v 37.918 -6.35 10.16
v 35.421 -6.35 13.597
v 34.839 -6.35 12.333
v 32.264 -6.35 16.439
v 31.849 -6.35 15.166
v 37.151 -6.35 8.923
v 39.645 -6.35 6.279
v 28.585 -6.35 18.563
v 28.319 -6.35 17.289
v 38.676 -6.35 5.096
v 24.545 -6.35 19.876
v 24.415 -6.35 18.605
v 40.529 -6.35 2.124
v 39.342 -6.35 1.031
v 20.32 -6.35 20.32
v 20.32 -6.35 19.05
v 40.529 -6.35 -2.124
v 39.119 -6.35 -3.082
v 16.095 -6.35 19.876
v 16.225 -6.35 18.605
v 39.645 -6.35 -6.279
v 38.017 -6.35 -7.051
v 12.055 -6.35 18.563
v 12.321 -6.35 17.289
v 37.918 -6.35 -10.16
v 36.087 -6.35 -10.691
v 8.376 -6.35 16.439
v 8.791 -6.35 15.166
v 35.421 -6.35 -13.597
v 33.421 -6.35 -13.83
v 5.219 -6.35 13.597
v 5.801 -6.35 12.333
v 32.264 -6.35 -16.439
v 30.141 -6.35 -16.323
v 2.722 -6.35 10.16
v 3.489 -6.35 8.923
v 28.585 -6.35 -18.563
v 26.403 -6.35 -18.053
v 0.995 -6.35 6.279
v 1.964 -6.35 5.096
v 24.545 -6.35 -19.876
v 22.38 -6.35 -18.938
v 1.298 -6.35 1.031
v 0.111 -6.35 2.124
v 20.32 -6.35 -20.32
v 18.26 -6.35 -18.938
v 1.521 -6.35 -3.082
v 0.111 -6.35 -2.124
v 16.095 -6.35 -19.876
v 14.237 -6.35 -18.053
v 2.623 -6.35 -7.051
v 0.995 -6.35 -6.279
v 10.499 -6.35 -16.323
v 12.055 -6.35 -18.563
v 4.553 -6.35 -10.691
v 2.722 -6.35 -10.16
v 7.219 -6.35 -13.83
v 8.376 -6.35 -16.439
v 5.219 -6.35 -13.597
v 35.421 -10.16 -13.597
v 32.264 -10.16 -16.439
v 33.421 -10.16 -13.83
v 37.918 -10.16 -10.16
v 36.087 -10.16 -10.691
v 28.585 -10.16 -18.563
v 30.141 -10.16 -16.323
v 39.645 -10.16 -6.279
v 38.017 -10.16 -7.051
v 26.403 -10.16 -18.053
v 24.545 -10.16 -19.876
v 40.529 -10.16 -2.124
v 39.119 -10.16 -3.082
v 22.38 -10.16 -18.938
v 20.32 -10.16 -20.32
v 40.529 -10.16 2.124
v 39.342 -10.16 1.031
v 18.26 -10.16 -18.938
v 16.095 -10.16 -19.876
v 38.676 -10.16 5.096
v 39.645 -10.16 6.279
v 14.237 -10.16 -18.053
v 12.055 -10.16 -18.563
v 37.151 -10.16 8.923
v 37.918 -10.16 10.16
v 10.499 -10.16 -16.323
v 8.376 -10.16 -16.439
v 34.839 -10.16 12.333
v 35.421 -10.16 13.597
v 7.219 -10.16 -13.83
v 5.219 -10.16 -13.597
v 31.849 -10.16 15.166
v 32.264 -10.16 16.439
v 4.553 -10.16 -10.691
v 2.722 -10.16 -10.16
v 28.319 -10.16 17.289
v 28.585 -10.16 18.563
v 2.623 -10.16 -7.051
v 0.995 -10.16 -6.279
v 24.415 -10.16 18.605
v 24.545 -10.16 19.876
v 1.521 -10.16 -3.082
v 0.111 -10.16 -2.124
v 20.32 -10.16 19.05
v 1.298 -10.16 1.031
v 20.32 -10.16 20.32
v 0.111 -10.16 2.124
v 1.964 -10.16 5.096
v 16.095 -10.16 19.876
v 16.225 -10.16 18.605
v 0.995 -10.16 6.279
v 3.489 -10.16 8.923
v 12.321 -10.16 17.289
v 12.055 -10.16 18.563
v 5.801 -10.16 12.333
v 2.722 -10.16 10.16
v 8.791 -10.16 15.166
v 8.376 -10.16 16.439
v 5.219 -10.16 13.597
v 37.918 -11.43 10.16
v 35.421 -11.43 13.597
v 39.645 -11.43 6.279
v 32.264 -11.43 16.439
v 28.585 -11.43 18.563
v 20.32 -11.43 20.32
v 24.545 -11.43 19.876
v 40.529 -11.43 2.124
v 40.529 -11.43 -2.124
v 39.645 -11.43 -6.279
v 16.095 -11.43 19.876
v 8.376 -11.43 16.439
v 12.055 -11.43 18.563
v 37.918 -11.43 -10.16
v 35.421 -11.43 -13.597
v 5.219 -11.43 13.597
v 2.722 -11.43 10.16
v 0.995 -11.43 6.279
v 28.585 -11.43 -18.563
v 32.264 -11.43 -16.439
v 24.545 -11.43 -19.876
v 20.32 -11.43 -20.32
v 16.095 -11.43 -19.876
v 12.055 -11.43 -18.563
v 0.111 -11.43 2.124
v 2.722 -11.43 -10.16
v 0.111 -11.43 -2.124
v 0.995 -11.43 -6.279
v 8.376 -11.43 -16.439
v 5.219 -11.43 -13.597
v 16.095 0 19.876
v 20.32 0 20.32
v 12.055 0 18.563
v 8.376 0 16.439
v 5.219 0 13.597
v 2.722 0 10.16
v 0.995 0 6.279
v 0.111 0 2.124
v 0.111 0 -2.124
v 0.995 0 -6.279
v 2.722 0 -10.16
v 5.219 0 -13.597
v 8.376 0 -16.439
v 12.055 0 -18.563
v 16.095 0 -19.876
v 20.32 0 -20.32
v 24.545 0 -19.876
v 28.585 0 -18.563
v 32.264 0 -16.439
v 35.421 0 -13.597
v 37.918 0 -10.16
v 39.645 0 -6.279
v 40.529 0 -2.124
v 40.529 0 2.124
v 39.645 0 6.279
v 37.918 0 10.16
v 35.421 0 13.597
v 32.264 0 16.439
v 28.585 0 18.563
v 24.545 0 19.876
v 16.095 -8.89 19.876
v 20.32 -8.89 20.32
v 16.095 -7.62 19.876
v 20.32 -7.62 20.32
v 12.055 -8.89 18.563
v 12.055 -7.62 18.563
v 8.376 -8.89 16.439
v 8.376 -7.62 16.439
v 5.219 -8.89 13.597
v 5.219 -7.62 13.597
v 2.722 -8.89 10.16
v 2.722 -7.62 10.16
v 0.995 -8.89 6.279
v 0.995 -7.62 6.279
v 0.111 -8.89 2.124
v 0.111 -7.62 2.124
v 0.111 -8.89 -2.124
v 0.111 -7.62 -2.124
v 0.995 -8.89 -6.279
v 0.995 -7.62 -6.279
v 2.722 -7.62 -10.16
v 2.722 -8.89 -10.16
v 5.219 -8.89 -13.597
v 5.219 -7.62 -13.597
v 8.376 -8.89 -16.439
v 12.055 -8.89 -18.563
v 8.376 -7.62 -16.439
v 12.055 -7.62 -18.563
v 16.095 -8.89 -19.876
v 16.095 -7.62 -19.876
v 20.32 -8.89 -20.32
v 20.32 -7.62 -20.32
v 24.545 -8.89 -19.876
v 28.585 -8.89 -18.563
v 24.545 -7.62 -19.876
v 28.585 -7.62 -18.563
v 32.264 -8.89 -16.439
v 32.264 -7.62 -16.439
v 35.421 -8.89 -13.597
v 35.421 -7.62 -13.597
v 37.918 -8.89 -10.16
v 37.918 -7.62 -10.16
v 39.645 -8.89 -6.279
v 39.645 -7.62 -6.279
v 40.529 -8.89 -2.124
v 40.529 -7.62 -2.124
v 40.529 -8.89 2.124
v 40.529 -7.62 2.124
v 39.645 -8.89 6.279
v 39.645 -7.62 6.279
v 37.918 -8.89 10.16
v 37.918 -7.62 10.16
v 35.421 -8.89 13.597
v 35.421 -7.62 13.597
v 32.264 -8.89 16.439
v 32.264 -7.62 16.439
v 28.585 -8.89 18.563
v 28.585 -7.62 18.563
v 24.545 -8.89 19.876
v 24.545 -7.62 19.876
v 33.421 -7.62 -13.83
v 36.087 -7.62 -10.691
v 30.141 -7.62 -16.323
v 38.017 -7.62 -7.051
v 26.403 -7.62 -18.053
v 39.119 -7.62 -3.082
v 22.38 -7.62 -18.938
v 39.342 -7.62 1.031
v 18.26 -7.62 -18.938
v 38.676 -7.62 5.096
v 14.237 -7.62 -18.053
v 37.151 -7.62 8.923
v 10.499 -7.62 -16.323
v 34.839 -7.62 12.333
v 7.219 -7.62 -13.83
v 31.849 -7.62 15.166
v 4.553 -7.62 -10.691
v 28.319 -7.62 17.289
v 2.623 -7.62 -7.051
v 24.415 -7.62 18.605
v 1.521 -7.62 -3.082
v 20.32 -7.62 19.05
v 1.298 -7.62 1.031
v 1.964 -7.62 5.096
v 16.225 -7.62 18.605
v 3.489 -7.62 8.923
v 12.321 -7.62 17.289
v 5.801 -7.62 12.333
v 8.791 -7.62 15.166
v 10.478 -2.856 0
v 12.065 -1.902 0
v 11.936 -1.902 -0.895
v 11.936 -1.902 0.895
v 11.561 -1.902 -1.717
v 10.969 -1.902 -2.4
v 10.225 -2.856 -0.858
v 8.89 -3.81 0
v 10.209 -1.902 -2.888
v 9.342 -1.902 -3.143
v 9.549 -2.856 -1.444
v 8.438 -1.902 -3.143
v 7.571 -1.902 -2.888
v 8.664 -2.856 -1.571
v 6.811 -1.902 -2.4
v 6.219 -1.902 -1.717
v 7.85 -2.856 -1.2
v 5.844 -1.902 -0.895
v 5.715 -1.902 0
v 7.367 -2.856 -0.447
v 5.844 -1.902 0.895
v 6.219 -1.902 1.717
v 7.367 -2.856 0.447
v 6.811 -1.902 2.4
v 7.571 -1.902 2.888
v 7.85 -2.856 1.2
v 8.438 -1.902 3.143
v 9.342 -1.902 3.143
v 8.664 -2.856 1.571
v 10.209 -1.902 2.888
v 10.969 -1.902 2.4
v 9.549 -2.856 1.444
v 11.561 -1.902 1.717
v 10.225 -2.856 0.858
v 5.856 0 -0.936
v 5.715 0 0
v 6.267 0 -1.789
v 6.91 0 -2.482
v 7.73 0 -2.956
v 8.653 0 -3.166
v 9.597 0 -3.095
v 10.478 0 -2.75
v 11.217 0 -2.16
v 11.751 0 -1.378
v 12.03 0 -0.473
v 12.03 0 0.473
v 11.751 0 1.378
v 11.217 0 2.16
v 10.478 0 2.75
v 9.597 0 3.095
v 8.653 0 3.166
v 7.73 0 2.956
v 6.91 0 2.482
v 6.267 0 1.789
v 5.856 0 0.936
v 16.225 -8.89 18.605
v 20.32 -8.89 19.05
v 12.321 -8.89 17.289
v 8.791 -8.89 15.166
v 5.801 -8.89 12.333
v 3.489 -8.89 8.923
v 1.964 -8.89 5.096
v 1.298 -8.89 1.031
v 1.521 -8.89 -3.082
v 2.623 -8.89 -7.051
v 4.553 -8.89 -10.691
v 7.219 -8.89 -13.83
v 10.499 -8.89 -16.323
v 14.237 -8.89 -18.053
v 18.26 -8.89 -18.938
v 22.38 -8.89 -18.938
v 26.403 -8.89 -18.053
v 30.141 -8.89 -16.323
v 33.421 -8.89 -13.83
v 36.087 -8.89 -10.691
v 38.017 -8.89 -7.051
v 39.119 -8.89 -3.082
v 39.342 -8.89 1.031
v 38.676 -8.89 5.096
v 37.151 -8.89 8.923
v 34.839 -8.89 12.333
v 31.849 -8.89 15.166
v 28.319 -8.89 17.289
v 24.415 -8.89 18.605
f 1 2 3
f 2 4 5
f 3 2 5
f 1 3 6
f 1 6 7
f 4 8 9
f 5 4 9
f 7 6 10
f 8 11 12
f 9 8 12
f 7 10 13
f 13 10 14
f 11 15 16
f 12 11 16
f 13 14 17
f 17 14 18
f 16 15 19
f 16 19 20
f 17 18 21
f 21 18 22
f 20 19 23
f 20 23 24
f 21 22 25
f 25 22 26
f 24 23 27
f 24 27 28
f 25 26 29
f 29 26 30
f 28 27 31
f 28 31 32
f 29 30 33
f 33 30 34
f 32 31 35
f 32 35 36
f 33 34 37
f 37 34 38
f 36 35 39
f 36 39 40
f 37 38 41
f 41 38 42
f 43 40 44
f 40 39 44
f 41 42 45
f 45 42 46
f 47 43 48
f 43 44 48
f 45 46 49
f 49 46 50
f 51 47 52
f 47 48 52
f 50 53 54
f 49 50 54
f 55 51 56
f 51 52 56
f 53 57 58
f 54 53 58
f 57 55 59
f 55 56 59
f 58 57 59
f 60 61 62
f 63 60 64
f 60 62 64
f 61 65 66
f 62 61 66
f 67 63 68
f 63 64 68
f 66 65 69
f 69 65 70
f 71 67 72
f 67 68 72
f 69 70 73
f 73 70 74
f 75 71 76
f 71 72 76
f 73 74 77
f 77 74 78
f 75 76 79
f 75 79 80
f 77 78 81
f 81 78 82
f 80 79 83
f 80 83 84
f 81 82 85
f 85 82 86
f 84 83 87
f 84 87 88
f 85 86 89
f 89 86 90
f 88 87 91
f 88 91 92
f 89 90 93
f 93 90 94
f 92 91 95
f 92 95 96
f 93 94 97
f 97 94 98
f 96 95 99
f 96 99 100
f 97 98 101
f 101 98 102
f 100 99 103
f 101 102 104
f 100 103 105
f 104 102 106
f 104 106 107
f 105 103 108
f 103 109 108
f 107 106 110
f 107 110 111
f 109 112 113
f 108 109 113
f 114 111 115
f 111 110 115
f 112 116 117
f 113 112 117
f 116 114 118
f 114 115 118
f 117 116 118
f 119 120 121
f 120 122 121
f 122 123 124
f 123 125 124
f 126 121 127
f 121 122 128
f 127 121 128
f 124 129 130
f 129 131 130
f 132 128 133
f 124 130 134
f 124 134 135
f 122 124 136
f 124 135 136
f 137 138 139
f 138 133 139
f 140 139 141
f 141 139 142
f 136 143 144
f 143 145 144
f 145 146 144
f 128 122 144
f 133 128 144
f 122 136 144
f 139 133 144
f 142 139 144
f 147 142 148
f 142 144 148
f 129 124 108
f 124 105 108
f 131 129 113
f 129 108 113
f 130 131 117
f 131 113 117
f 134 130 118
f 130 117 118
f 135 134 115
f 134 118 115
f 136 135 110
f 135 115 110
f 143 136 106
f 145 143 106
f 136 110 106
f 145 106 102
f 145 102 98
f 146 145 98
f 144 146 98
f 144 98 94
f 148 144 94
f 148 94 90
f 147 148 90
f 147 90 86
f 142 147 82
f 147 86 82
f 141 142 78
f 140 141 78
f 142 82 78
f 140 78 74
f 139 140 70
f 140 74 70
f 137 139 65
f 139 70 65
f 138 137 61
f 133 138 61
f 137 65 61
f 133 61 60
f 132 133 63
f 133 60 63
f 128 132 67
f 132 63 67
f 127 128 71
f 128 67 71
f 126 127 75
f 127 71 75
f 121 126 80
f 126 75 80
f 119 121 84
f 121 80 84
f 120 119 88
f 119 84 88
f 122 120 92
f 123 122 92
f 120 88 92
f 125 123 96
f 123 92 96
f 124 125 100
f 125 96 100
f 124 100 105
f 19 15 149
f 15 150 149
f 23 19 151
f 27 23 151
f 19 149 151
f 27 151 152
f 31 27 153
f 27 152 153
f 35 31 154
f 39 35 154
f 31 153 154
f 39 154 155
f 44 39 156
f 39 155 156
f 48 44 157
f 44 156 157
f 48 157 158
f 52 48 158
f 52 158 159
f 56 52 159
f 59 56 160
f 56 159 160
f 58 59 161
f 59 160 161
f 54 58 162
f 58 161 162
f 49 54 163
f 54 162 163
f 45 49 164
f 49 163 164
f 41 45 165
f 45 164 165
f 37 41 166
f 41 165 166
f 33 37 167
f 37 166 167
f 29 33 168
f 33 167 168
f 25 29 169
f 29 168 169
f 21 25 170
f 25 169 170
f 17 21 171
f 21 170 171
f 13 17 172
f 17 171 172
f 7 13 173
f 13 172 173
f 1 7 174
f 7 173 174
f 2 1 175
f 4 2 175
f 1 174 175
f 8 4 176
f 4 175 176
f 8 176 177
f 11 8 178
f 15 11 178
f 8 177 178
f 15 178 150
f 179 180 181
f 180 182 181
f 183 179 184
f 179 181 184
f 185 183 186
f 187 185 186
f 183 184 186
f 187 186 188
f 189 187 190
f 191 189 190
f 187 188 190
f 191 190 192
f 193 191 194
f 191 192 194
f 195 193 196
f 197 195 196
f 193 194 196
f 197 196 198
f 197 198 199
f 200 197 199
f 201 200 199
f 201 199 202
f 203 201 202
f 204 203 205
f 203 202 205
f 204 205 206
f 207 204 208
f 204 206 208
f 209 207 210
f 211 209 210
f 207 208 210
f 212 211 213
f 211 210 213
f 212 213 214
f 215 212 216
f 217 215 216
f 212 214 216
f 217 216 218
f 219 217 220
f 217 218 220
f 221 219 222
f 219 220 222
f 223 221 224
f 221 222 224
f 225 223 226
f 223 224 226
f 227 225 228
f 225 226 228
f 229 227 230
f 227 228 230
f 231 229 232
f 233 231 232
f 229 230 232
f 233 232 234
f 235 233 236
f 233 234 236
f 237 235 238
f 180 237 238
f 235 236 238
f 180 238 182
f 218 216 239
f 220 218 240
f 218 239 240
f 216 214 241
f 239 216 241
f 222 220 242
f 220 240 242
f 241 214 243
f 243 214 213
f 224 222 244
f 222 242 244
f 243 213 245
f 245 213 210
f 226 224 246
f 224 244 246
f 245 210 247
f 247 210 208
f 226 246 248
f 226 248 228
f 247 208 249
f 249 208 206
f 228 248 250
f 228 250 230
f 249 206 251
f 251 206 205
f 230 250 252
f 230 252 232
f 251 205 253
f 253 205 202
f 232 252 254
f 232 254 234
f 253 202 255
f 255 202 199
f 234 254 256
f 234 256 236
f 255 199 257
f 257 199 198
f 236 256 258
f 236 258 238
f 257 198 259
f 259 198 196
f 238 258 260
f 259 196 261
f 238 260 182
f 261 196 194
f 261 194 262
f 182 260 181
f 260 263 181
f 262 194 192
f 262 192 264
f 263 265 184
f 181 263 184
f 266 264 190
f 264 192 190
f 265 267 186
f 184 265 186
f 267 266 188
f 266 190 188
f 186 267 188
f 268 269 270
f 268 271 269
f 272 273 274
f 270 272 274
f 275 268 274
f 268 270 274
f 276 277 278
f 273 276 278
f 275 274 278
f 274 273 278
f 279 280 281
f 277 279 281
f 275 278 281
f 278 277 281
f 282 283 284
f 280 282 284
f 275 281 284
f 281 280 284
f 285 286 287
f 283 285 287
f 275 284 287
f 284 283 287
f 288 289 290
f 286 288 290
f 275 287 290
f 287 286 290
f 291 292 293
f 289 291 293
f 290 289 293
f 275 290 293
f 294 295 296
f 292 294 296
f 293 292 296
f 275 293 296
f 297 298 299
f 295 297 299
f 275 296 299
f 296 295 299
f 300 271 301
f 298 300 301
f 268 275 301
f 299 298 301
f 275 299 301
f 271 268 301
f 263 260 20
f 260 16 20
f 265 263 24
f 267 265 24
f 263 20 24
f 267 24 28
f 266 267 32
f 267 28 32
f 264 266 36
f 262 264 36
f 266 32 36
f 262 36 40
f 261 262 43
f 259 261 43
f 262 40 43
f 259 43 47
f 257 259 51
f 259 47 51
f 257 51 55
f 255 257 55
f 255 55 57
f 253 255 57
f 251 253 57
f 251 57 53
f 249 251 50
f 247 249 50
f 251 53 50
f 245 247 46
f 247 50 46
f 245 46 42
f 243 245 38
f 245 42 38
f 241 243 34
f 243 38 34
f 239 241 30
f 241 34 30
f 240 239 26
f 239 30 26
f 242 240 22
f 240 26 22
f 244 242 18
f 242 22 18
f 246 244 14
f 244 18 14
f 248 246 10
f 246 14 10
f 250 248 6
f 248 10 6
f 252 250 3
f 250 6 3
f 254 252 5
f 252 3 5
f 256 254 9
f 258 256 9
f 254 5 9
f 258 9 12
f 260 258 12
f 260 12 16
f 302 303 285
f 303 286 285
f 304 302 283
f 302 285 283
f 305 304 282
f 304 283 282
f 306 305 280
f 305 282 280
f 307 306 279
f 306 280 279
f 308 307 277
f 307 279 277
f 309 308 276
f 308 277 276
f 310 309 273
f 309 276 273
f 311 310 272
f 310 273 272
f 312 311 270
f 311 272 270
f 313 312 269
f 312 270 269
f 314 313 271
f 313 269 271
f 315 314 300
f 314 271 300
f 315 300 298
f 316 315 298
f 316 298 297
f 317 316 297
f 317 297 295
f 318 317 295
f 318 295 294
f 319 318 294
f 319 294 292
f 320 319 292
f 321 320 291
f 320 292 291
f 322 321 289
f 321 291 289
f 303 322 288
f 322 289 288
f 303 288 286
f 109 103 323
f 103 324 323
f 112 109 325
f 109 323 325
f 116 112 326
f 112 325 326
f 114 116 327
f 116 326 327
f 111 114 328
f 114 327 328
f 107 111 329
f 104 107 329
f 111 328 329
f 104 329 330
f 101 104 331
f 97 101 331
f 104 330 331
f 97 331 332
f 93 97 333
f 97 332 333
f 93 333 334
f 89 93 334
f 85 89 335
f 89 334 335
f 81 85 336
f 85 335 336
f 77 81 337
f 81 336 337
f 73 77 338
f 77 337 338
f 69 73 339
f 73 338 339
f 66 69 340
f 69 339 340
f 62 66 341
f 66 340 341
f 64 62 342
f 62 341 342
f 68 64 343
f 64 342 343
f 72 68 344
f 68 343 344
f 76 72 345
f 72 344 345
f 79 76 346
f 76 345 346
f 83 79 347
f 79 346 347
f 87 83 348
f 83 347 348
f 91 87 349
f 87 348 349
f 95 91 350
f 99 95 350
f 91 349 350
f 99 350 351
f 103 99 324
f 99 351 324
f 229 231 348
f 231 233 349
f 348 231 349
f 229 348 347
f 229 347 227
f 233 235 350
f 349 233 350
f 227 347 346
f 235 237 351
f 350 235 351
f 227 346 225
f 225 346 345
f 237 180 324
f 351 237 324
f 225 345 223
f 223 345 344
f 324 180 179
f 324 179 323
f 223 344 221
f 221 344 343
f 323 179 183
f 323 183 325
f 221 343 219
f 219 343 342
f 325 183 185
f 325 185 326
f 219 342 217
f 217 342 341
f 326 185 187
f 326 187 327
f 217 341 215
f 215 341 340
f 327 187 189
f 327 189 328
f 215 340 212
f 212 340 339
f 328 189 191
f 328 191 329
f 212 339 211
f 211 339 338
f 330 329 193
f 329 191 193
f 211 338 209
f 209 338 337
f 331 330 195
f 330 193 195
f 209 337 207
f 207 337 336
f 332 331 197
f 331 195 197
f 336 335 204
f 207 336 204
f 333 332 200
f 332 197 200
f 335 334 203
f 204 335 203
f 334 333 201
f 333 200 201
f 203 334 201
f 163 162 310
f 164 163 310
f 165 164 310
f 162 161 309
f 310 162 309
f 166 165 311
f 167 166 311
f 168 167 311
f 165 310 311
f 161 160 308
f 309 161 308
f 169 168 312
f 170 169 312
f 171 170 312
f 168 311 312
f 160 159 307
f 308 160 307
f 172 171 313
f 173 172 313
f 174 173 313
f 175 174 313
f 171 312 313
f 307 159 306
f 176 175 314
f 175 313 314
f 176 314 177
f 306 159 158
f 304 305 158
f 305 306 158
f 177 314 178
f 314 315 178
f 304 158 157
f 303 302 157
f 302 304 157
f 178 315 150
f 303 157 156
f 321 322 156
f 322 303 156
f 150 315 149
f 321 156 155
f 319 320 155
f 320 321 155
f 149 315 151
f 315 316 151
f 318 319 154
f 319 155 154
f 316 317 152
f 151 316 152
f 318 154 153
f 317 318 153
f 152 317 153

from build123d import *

# Parameters (mm, degrees)
F_1_4_0_25_DIAMETER_HOLE6_D     = 6.35
F_1_4_0_25_DIAMETER_HOLE6_DEPTH = 1.902267535
F_1_4_0_25_DIAMETER_HOLE6_TIP   = 1.907732465


with BuildPart() as part:
    # Sketch2 → base_revolve (revolve)
    with BuildSketch(Plane.XY, mode=Mode.PRIVATE) as base_revolve_sk:
        Polygon((20.32, 0), (20.32, -11.43), (0, -11.43), (0, -10.16), (1.27, -10.16), (1.27, -8.89), (0, -8.89), (0, -7.62), (1.27, -7.62), (1.27, -6.35), (0, -6.35), (0, 0), align=None)
    revolve(base_revolve_sk.sketch.rotate(Axis((20.32, 0, 0), (0, -1, 0)), 270), axis=Axis((20.32, 0, 0), (0, -1, 0)))

    # 1/4 (0.25) Diameter Hole6
    with Locations(Plane(origin=(0, 0, 0), x_dir=(1, 0, 0), z_dir=(0, 1, 0))):
        with Locations((8.89, 0)):
            Hole(F_1_4_0_25_DIAMETER_HOLE6_D / 2, depth=F_1_4_0_25_DIAMETER_HOLE6_DEPTH)
            with Locations((0, 0, -(F_1_4_0_25_DIAMETER_HOLE6_DEPTH + F_1_4_0_25_DIAMETER_HOLE6_TIP / 2))):  # 118° drill point
                Cone(0, F_1_4_0_25_DIAMETER_HOLE6_D / 2, F_1_4_0_25_DIAMETER_HOLE6_TIP, mode=Mode.SUBTRACT)


solid = part.part
